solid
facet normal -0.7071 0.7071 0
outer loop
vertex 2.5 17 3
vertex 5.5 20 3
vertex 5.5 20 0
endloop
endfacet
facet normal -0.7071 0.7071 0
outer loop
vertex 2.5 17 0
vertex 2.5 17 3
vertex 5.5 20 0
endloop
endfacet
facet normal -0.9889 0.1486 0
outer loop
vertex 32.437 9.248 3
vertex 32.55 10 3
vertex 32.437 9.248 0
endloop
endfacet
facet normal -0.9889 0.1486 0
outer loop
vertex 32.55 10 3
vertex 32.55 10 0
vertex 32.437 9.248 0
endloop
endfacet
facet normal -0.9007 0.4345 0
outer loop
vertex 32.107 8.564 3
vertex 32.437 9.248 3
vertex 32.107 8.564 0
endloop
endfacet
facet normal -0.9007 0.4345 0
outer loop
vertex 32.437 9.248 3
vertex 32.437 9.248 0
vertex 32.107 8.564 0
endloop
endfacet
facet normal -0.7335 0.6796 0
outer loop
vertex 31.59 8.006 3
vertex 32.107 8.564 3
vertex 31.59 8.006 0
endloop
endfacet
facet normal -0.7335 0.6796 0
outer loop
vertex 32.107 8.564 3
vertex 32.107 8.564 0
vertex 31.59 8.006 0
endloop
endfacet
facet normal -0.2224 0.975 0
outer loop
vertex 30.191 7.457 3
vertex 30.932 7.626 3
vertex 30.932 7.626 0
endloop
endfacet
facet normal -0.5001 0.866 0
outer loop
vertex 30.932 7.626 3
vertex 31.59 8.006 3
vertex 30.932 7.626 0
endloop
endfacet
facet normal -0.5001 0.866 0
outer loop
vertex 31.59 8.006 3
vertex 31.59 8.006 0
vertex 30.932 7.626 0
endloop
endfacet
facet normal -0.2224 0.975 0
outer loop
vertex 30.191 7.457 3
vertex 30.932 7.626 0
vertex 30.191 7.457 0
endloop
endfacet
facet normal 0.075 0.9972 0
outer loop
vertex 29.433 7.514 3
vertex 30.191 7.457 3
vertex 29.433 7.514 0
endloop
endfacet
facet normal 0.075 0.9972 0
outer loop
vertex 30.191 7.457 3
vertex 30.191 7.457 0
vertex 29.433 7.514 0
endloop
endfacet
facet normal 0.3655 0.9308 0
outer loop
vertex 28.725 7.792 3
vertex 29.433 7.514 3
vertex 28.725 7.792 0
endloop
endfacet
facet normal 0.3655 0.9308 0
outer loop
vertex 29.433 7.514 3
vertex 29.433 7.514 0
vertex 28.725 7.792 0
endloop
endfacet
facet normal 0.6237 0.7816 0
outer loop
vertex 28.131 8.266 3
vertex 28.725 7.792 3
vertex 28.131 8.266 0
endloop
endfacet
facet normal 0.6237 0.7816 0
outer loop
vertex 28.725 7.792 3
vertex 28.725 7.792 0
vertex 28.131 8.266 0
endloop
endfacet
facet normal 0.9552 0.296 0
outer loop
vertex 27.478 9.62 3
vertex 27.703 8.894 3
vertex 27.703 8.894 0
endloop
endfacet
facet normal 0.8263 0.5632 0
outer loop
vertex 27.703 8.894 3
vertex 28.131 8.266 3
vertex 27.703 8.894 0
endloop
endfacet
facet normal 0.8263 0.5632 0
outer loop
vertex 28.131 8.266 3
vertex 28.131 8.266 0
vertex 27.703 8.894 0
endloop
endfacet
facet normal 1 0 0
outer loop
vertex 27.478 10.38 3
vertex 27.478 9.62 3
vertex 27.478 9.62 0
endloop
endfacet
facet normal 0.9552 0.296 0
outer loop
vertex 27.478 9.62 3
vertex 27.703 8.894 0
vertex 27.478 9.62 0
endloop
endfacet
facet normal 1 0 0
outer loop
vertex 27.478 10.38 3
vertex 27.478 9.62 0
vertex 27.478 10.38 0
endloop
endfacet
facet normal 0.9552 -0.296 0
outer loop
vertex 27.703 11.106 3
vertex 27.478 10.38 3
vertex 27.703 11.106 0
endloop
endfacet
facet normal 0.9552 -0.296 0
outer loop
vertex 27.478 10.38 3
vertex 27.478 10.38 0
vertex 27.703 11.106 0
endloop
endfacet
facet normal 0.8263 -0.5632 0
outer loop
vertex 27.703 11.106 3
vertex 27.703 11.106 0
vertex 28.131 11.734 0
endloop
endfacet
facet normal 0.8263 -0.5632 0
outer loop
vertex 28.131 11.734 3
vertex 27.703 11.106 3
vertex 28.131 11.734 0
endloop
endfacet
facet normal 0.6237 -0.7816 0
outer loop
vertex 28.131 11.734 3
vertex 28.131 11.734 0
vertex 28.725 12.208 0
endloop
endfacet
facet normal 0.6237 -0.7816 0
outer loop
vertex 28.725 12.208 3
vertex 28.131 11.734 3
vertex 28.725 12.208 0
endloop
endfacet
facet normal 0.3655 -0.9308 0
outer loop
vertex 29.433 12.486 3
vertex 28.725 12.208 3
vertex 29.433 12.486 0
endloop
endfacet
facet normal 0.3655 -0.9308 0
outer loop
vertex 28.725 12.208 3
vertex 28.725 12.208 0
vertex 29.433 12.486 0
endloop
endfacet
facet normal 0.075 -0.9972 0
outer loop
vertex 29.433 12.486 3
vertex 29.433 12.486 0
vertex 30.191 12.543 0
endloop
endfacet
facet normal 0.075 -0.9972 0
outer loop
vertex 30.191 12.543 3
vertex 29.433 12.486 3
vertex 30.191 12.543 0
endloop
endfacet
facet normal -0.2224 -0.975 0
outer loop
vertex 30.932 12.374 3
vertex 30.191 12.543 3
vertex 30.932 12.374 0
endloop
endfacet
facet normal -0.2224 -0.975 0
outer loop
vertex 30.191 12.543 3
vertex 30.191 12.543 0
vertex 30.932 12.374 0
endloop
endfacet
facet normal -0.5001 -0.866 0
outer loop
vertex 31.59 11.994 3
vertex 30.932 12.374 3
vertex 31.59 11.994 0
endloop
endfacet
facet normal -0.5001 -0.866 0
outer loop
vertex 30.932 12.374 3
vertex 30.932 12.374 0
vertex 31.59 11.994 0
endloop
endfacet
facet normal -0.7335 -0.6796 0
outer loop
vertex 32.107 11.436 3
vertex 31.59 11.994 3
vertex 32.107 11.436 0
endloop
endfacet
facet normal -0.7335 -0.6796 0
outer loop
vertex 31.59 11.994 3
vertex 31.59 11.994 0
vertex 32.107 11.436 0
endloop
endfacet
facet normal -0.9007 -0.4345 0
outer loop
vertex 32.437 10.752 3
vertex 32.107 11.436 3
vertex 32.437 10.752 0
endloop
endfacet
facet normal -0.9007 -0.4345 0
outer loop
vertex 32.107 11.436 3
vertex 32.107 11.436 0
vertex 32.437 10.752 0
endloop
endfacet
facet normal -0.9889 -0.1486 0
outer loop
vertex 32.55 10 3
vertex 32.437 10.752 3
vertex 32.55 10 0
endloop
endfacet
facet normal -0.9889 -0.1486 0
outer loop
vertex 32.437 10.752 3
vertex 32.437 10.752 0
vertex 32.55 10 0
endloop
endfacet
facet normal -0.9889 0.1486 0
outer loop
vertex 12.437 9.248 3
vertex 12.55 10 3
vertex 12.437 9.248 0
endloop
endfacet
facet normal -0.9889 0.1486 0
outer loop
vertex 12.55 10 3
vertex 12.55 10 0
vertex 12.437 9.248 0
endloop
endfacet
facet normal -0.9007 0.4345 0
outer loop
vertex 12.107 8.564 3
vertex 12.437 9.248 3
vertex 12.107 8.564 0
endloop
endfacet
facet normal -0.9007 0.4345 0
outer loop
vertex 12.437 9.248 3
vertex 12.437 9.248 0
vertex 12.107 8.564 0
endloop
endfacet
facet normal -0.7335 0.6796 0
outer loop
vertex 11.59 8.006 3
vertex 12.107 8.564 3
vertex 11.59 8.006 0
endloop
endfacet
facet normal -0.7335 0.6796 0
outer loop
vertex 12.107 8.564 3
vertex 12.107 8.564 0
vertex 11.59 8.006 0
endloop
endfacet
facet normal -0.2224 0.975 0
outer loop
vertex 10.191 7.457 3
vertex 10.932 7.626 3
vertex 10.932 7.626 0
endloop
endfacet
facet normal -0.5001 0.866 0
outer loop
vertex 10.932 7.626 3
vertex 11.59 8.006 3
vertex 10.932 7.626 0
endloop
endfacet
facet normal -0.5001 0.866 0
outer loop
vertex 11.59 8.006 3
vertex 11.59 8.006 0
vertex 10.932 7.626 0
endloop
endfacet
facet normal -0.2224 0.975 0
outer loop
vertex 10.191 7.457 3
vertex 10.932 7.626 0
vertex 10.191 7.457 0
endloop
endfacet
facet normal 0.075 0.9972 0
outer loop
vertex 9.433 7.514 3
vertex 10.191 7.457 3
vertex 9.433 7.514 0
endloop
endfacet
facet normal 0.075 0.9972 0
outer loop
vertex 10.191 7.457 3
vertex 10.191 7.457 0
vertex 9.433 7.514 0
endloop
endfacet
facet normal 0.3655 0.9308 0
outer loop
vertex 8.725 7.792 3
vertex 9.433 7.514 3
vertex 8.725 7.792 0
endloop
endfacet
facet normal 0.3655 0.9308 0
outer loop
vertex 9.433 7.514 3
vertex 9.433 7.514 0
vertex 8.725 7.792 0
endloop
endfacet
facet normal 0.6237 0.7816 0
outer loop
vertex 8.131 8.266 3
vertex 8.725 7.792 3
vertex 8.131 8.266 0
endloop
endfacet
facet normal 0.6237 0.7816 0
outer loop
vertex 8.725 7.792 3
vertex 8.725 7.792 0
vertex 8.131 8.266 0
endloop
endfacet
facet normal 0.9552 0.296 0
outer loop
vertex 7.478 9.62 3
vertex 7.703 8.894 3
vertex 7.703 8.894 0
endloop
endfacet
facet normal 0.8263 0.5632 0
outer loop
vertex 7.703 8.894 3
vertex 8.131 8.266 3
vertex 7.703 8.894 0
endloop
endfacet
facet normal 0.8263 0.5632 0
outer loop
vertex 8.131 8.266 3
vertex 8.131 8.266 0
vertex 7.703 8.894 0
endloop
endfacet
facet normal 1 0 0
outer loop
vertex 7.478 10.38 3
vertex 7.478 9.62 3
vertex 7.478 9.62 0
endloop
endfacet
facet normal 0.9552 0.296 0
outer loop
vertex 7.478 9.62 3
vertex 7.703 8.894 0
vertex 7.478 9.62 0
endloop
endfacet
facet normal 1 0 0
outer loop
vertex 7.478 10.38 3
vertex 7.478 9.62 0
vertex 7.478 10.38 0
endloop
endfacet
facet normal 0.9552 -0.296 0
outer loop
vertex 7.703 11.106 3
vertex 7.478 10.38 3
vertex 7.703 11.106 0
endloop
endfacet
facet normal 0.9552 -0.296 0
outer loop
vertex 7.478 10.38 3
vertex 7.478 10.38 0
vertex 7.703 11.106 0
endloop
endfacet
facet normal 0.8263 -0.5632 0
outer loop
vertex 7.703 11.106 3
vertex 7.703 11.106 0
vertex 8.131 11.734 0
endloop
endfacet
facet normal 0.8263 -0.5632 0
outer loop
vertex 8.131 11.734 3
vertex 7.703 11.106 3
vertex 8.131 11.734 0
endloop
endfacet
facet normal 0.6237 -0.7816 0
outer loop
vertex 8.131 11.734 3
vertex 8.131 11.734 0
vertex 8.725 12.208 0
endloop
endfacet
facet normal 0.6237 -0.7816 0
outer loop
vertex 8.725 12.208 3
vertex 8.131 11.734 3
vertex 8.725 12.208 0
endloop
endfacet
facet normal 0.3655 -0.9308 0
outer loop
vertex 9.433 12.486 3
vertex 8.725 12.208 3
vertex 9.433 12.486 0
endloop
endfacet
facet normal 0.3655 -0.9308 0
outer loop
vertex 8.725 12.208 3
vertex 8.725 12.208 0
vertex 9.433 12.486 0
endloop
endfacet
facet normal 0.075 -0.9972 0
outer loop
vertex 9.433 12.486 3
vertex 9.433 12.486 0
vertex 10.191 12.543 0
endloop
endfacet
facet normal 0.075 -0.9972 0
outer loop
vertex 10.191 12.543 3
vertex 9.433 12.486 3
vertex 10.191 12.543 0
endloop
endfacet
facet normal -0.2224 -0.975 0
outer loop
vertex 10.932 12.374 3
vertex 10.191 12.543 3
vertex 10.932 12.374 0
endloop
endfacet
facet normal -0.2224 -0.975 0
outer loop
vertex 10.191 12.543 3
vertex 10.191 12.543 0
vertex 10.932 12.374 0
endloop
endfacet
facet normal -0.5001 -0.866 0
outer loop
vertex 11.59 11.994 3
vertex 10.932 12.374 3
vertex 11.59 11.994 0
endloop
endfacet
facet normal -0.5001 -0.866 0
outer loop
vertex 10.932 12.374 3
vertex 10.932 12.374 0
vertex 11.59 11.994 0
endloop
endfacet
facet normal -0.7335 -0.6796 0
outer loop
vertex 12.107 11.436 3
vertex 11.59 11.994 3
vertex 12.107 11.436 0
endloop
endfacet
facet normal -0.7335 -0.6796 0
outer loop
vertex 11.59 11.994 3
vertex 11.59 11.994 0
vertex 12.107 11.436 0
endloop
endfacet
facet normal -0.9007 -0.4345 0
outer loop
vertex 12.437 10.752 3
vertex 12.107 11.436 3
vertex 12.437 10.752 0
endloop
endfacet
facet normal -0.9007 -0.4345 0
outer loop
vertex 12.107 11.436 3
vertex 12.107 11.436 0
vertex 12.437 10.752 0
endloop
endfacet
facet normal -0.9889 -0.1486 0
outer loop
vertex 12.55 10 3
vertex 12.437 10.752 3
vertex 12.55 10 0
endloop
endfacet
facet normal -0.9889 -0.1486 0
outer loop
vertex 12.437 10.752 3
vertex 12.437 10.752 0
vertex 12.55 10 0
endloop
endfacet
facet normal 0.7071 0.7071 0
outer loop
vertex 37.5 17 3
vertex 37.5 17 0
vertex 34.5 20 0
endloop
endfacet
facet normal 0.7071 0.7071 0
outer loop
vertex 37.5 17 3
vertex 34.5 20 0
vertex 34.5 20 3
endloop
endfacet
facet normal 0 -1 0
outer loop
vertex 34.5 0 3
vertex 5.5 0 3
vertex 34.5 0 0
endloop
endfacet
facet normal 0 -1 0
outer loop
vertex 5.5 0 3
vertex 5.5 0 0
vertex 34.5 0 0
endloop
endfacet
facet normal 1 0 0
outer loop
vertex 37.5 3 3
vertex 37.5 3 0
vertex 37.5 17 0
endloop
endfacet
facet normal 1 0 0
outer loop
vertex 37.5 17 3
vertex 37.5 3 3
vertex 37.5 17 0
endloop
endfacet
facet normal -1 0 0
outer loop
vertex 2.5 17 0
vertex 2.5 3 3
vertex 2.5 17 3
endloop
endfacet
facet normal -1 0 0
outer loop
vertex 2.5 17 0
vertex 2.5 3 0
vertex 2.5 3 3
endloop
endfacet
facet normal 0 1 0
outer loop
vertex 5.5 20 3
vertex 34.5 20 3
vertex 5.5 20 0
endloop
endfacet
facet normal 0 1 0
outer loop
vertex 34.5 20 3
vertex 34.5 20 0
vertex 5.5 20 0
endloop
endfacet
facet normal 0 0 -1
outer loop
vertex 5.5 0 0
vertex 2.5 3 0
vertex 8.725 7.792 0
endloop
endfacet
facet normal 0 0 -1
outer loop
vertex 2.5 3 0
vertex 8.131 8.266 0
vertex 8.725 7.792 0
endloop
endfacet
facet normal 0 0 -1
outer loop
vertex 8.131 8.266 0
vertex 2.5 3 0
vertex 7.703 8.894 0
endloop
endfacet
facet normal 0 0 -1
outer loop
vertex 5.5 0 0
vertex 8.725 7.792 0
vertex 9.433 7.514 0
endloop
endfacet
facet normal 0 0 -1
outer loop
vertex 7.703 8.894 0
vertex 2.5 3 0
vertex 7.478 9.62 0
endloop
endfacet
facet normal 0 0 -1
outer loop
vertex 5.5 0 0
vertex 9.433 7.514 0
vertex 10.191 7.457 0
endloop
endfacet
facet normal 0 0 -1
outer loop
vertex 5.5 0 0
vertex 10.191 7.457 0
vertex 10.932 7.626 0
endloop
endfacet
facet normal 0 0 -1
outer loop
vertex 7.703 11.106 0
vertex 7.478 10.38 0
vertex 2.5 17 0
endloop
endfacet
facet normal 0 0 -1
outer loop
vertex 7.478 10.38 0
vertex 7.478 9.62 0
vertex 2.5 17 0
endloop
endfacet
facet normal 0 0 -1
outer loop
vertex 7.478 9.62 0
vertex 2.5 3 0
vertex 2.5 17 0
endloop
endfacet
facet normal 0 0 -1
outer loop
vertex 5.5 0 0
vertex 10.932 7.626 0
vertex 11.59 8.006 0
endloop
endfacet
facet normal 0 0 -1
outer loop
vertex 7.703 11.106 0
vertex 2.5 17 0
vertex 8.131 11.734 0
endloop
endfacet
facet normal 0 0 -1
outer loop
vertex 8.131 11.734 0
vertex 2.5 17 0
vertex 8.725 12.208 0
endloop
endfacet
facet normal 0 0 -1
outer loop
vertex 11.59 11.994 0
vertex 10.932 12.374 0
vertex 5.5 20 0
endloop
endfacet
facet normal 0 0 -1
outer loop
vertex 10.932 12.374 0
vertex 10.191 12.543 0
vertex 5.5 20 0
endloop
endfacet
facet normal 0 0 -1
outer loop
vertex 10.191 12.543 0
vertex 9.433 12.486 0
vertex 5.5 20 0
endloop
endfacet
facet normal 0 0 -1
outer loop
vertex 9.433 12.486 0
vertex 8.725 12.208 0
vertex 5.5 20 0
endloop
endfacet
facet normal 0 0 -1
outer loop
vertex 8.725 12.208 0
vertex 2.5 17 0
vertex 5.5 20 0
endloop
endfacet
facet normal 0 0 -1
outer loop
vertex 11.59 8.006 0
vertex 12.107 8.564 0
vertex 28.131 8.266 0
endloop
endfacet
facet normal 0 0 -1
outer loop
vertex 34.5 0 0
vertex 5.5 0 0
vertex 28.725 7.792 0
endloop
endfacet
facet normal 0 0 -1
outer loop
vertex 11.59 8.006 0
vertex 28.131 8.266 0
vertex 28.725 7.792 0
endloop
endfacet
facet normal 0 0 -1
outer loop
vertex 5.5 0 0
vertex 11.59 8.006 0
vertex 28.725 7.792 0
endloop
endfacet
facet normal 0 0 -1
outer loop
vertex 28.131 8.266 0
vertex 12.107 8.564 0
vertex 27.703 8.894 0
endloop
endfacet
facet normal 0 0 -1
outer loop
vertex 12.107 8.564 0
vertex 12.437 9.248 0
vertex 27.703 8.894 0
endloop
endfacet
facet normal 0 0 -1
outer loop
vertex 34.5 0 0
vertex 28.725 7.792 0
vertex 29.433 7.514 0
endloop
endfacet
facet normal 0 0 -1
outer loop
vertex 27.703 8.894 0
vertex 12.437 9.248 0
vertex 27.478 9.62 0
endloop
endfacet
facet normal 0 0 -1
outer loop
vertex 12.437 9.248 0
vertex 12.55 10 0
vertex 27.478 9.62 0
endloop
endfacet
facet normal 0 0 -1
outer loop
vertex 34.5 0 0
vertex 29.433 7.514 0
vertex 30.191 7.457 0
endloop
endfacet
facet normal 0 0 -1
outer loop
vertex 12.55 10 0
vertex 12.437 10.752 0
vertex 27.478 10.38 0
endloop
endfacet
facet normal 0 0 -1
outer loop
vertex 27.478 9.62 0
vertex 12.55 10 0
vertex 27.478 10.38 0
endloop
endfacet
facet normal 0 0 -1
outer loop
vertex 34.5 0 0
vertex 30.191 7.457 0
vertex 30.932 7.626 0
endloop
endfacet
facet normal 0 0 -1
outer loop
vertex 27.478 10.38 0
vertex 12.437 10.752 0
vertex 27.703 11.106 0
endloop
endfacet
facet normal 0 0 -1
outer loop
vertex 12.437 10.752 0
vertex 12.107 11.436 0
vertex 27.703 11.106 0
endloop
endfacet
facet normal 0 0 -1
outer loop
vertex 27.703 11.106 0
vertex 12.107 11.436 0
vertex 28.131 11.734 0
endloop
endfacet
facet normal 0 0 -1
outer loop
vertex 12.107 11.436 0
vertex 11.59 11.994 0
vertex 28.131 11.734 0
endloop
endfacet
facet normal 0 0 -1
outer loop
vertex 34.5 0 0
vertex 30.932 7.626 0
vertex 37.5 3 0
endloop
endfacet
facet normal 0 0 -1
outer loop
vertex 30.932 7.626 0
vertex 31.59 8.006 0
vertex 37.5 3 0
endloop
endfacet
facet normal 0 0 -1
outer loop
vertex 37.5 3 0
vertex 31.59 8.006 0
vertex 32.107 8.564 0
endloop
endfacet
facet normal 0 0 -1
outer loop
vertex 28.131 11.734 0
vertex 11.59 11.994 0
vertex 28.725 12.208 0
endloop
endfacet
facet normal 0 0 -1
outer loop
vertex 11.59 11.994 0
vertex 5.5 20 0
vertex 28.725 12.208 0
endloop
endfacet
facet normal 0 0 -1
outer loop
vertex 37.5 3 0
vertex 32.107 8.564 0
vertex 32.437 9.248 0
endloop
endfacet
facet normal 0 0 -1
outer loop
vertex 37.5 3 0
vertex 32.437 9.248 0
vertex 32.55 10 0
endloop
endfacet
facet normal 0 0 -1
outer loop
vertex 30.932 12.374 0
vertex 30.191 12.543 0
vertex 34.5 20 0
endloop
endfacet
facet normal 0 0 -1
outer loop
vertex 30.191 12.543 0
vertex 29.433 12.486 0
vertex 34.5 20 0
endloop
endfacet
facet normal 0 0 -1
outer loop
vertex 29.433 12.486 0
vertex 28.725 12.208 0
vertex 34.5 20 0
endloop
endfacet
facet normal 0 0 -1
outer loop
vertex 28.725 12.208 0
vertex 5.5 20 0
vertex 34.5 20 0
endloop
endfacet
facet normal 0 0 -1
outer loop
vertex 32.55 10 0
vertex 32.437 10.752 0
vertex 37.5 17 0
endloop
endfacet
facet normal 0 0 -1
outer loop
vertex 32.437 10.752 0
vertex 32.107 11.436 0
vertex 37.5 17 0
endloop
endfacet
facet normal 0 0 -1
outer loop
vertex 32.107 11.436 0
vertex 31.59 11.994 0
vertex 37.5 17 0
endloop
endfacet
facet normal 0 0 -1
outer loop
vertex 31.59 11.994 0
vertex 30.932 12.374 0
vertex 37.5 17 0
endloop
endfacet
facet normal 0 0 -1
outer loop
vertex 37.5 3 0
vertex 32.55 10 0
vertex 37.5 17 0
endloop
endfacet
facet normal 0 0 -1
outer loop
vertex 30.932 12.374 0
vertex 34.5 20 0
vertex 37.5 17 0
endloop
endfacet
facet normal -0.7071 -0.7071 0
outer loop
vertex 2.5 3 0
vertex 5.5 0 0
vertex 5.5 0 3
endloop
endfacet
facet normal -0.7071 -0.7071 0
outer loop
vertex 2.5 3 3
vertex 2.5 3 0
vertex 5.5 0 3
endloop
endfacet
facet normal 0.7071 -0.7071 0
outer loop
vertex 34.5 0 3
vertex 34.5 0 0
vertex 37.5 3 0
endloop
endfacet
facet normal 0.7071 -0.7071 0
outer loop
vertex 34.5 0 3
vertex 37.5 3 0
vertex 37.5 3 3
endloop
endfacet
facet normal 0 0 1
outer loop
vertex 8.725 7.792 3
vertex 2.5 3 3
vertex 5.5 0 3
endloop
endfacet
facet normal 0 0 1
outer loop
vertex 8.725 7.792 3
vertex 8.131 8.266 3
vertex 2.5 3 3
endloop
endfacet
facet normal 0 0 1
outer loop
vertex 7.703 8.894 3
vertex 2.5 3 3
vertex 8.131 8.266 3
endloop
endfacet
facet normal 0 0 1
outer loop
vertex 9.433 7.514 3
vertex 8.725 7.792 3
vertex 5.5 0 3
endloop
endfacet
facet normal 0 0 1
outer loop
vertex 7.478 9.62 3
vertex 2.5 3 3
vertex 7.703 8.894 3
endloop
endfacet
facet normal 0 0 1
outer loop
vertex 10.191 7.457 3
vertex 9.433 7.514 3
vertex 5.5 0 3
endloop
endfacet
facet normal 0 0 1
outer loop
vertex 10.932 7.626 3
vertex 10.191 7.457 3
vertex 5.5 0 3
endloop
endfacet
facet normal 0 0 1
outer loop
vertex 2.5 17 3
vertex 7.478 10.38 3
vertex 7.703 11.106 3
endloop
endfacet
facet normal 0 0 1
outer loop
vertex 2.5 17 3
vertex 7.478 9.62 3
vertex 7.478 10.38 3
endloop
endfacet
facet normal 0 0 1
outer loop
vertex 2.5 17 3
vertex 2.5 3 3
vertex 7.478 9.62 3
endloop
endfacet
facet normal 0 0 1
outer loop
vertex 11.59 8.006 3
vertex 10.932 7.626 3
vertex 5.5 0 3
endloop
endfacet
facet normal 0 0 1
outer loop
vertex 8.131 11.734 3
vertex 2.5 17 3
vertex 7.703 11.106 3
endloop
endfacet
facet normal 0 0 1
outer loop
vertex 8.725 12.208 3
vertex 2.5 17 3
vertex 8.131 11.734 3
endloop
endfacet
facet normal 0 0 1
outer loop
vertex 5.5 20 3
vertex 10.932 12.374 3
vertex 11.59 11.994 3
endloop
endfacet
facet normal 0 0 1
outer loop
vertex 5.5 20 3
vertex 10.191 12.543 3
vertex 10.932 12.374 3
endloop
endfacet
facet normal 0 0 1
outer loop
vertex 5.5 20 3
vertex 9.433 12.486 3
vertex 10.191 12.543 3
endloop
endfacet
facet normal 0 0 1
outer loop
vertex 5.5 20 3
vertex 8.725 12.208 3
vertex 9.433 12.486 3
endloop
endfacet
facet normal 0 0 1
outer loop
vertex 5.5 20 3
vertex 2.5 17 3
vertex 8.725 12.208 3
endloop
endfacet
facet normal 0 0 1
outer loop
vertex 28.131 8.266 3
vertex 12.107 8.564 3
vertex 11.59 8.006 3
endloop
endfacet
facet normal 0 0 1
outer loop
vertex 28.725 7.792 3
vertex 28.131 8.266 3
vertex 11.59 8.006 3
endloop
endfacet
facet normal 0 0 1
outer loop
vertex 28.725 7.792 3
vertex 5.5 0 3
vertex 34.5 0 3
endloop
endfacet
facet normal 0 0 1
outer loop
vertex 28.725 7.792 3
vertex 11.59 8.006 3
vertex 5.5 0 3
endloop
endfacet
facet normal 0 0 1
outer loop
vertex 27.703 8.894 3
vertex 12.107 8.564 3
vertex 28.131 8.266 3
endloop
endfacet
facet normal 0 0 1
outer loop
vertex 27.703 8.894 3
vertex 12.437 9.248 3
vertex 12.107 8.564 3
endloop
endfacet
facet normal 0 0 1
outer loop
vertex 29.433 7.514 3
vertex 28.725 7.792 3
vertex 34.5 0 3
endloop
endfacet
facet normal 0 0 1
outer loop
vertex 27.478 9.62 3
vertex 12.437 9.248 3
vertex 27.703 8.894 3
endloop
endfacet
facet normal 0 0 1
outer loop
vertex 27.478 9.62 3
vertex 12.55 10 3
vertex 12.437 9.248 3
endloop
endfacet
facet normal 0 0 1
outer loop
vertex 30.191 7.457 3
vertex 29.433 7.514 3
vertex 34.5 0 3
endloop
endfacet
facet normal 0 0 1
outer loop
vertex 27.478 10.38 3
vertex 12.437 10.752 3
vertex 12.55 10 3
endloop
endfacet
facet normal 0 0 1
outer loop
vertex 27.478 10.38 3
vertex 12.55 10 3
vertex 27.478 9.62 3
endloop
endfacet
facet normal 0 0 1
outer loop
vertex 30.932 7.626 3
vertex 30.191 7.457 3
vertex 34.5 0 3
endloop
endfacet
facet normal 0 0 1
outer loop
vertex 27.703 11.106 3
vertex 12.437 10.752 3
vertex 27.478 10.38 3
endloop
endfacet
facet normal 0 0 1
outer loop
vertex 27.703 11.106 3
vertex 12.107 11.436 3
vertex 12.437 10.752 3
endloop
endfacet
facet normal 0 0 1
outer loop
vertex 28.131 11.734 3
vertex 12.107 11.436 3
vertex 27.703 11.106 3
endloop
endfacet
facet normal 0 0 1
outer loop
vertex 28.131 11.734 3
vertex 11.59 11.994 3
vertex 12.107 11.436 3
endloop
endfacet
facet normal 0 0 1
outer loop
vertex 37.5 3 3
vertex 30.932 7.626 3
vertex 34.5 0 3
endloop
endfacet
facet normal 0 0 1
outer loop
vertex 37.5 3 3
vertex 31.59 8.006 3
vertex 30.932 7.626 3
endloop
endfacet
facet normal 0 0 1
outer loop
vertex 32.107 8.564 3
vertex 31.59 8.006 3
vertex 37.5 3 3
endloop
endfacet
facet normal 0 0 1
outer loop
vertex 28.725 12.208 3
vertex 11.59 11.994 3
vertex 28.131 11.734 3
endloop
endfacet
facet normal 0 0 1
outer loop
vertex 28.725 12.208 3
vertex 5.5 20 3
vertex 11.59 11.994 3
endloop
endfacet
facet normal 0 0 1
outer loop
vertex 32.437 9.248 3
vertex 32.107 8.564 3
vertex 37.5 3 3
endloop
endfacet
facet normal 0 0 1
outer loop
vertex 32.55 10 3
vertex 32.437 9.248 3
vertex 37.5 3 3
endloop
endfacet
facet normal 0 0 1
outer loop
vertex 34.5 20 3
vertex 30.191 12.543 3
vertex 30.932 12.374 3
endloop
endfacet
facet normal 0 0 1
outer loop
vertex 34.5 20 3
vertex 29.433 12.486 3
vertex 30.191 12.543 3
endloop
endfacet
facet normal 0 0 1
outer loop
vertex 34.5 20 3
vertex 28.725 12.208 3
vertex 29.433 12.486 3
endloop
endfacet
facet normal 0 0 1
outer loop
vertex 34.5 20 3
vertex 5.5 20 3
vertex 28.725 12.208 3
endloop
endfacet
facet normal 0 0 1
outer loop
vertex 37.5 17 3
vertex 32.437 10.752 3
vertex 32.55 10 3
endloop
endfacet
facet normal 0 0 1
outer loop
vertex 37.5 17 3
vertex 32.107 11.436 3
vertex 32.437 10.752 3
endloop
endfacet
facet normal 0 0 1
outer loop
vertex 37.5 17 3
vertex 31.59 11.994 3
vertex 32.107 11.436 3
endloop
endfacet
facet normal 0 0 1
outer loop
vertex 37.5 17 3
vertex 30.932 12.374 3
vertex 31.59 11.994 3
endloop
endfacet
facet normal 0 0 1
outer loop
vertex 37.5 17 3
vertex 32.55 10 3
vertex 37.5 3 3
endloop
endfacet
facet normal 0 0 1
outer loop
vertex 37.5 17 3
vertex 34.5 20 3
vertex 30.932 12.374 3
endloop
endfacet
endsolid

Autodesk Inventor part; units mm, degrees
ref_plane "YZ Plane" through (0, 0, 0) normal (1, 0, 0) x (0, 1, 0)
ref_plane "XZ Plane" through (0, 0, 0) normal (0, 1, 0) x (-1, 0, 0)
ref_plane "XY Plane" through (0, 0, 0) normal (0, 0, 1) x (1, 0, 0)
sketch "Sketch1" plane through (0, 0, 0) normal (0, 0, 1) x (1, 0, 0)
  line L0 (0, 0) -> (40, 0)
  line L1 (40, 0) -> (40, 20)
  line L2 (40, 20) -> (0, 20)
  line L3 (0, 20) -> (0, 0)
  line L4 (0, 10) -> (10, 10) construction
  line L5 (10, 10) -> (30, 10) construction
  circle A0 centre (10, 10) radius 2.55
  circle A1 centre (30, 10) radius 2.55
  line L6 (37.5, 0) -> (37.5, 20)
  line L7 (2.5, 0) -> (2.5, 20)
  dimension "d0" = 40
  dimension "d1" = 20
  dimension "d2" = 10
  dimension "d3" = 20
  dimension "d4" = 5.1
  dimension "d5" = 5.1
  dimension "d8" = 2.5
  dimension "d9" = 2.5
extrude "Extrusion1" add sketch "Sketch1" along normal blind 3 contours L7 L2 L6 L0
chamfer "Chamfer1" distance 3 angle 45 4 edges at (37.5, 0, 1.5) (37.5, 20, 1.5) (2.5, 20, 1.5) (2.5, 0, 1.5)
properties part number "Platinas de unión" material "Aluminum 6061"
